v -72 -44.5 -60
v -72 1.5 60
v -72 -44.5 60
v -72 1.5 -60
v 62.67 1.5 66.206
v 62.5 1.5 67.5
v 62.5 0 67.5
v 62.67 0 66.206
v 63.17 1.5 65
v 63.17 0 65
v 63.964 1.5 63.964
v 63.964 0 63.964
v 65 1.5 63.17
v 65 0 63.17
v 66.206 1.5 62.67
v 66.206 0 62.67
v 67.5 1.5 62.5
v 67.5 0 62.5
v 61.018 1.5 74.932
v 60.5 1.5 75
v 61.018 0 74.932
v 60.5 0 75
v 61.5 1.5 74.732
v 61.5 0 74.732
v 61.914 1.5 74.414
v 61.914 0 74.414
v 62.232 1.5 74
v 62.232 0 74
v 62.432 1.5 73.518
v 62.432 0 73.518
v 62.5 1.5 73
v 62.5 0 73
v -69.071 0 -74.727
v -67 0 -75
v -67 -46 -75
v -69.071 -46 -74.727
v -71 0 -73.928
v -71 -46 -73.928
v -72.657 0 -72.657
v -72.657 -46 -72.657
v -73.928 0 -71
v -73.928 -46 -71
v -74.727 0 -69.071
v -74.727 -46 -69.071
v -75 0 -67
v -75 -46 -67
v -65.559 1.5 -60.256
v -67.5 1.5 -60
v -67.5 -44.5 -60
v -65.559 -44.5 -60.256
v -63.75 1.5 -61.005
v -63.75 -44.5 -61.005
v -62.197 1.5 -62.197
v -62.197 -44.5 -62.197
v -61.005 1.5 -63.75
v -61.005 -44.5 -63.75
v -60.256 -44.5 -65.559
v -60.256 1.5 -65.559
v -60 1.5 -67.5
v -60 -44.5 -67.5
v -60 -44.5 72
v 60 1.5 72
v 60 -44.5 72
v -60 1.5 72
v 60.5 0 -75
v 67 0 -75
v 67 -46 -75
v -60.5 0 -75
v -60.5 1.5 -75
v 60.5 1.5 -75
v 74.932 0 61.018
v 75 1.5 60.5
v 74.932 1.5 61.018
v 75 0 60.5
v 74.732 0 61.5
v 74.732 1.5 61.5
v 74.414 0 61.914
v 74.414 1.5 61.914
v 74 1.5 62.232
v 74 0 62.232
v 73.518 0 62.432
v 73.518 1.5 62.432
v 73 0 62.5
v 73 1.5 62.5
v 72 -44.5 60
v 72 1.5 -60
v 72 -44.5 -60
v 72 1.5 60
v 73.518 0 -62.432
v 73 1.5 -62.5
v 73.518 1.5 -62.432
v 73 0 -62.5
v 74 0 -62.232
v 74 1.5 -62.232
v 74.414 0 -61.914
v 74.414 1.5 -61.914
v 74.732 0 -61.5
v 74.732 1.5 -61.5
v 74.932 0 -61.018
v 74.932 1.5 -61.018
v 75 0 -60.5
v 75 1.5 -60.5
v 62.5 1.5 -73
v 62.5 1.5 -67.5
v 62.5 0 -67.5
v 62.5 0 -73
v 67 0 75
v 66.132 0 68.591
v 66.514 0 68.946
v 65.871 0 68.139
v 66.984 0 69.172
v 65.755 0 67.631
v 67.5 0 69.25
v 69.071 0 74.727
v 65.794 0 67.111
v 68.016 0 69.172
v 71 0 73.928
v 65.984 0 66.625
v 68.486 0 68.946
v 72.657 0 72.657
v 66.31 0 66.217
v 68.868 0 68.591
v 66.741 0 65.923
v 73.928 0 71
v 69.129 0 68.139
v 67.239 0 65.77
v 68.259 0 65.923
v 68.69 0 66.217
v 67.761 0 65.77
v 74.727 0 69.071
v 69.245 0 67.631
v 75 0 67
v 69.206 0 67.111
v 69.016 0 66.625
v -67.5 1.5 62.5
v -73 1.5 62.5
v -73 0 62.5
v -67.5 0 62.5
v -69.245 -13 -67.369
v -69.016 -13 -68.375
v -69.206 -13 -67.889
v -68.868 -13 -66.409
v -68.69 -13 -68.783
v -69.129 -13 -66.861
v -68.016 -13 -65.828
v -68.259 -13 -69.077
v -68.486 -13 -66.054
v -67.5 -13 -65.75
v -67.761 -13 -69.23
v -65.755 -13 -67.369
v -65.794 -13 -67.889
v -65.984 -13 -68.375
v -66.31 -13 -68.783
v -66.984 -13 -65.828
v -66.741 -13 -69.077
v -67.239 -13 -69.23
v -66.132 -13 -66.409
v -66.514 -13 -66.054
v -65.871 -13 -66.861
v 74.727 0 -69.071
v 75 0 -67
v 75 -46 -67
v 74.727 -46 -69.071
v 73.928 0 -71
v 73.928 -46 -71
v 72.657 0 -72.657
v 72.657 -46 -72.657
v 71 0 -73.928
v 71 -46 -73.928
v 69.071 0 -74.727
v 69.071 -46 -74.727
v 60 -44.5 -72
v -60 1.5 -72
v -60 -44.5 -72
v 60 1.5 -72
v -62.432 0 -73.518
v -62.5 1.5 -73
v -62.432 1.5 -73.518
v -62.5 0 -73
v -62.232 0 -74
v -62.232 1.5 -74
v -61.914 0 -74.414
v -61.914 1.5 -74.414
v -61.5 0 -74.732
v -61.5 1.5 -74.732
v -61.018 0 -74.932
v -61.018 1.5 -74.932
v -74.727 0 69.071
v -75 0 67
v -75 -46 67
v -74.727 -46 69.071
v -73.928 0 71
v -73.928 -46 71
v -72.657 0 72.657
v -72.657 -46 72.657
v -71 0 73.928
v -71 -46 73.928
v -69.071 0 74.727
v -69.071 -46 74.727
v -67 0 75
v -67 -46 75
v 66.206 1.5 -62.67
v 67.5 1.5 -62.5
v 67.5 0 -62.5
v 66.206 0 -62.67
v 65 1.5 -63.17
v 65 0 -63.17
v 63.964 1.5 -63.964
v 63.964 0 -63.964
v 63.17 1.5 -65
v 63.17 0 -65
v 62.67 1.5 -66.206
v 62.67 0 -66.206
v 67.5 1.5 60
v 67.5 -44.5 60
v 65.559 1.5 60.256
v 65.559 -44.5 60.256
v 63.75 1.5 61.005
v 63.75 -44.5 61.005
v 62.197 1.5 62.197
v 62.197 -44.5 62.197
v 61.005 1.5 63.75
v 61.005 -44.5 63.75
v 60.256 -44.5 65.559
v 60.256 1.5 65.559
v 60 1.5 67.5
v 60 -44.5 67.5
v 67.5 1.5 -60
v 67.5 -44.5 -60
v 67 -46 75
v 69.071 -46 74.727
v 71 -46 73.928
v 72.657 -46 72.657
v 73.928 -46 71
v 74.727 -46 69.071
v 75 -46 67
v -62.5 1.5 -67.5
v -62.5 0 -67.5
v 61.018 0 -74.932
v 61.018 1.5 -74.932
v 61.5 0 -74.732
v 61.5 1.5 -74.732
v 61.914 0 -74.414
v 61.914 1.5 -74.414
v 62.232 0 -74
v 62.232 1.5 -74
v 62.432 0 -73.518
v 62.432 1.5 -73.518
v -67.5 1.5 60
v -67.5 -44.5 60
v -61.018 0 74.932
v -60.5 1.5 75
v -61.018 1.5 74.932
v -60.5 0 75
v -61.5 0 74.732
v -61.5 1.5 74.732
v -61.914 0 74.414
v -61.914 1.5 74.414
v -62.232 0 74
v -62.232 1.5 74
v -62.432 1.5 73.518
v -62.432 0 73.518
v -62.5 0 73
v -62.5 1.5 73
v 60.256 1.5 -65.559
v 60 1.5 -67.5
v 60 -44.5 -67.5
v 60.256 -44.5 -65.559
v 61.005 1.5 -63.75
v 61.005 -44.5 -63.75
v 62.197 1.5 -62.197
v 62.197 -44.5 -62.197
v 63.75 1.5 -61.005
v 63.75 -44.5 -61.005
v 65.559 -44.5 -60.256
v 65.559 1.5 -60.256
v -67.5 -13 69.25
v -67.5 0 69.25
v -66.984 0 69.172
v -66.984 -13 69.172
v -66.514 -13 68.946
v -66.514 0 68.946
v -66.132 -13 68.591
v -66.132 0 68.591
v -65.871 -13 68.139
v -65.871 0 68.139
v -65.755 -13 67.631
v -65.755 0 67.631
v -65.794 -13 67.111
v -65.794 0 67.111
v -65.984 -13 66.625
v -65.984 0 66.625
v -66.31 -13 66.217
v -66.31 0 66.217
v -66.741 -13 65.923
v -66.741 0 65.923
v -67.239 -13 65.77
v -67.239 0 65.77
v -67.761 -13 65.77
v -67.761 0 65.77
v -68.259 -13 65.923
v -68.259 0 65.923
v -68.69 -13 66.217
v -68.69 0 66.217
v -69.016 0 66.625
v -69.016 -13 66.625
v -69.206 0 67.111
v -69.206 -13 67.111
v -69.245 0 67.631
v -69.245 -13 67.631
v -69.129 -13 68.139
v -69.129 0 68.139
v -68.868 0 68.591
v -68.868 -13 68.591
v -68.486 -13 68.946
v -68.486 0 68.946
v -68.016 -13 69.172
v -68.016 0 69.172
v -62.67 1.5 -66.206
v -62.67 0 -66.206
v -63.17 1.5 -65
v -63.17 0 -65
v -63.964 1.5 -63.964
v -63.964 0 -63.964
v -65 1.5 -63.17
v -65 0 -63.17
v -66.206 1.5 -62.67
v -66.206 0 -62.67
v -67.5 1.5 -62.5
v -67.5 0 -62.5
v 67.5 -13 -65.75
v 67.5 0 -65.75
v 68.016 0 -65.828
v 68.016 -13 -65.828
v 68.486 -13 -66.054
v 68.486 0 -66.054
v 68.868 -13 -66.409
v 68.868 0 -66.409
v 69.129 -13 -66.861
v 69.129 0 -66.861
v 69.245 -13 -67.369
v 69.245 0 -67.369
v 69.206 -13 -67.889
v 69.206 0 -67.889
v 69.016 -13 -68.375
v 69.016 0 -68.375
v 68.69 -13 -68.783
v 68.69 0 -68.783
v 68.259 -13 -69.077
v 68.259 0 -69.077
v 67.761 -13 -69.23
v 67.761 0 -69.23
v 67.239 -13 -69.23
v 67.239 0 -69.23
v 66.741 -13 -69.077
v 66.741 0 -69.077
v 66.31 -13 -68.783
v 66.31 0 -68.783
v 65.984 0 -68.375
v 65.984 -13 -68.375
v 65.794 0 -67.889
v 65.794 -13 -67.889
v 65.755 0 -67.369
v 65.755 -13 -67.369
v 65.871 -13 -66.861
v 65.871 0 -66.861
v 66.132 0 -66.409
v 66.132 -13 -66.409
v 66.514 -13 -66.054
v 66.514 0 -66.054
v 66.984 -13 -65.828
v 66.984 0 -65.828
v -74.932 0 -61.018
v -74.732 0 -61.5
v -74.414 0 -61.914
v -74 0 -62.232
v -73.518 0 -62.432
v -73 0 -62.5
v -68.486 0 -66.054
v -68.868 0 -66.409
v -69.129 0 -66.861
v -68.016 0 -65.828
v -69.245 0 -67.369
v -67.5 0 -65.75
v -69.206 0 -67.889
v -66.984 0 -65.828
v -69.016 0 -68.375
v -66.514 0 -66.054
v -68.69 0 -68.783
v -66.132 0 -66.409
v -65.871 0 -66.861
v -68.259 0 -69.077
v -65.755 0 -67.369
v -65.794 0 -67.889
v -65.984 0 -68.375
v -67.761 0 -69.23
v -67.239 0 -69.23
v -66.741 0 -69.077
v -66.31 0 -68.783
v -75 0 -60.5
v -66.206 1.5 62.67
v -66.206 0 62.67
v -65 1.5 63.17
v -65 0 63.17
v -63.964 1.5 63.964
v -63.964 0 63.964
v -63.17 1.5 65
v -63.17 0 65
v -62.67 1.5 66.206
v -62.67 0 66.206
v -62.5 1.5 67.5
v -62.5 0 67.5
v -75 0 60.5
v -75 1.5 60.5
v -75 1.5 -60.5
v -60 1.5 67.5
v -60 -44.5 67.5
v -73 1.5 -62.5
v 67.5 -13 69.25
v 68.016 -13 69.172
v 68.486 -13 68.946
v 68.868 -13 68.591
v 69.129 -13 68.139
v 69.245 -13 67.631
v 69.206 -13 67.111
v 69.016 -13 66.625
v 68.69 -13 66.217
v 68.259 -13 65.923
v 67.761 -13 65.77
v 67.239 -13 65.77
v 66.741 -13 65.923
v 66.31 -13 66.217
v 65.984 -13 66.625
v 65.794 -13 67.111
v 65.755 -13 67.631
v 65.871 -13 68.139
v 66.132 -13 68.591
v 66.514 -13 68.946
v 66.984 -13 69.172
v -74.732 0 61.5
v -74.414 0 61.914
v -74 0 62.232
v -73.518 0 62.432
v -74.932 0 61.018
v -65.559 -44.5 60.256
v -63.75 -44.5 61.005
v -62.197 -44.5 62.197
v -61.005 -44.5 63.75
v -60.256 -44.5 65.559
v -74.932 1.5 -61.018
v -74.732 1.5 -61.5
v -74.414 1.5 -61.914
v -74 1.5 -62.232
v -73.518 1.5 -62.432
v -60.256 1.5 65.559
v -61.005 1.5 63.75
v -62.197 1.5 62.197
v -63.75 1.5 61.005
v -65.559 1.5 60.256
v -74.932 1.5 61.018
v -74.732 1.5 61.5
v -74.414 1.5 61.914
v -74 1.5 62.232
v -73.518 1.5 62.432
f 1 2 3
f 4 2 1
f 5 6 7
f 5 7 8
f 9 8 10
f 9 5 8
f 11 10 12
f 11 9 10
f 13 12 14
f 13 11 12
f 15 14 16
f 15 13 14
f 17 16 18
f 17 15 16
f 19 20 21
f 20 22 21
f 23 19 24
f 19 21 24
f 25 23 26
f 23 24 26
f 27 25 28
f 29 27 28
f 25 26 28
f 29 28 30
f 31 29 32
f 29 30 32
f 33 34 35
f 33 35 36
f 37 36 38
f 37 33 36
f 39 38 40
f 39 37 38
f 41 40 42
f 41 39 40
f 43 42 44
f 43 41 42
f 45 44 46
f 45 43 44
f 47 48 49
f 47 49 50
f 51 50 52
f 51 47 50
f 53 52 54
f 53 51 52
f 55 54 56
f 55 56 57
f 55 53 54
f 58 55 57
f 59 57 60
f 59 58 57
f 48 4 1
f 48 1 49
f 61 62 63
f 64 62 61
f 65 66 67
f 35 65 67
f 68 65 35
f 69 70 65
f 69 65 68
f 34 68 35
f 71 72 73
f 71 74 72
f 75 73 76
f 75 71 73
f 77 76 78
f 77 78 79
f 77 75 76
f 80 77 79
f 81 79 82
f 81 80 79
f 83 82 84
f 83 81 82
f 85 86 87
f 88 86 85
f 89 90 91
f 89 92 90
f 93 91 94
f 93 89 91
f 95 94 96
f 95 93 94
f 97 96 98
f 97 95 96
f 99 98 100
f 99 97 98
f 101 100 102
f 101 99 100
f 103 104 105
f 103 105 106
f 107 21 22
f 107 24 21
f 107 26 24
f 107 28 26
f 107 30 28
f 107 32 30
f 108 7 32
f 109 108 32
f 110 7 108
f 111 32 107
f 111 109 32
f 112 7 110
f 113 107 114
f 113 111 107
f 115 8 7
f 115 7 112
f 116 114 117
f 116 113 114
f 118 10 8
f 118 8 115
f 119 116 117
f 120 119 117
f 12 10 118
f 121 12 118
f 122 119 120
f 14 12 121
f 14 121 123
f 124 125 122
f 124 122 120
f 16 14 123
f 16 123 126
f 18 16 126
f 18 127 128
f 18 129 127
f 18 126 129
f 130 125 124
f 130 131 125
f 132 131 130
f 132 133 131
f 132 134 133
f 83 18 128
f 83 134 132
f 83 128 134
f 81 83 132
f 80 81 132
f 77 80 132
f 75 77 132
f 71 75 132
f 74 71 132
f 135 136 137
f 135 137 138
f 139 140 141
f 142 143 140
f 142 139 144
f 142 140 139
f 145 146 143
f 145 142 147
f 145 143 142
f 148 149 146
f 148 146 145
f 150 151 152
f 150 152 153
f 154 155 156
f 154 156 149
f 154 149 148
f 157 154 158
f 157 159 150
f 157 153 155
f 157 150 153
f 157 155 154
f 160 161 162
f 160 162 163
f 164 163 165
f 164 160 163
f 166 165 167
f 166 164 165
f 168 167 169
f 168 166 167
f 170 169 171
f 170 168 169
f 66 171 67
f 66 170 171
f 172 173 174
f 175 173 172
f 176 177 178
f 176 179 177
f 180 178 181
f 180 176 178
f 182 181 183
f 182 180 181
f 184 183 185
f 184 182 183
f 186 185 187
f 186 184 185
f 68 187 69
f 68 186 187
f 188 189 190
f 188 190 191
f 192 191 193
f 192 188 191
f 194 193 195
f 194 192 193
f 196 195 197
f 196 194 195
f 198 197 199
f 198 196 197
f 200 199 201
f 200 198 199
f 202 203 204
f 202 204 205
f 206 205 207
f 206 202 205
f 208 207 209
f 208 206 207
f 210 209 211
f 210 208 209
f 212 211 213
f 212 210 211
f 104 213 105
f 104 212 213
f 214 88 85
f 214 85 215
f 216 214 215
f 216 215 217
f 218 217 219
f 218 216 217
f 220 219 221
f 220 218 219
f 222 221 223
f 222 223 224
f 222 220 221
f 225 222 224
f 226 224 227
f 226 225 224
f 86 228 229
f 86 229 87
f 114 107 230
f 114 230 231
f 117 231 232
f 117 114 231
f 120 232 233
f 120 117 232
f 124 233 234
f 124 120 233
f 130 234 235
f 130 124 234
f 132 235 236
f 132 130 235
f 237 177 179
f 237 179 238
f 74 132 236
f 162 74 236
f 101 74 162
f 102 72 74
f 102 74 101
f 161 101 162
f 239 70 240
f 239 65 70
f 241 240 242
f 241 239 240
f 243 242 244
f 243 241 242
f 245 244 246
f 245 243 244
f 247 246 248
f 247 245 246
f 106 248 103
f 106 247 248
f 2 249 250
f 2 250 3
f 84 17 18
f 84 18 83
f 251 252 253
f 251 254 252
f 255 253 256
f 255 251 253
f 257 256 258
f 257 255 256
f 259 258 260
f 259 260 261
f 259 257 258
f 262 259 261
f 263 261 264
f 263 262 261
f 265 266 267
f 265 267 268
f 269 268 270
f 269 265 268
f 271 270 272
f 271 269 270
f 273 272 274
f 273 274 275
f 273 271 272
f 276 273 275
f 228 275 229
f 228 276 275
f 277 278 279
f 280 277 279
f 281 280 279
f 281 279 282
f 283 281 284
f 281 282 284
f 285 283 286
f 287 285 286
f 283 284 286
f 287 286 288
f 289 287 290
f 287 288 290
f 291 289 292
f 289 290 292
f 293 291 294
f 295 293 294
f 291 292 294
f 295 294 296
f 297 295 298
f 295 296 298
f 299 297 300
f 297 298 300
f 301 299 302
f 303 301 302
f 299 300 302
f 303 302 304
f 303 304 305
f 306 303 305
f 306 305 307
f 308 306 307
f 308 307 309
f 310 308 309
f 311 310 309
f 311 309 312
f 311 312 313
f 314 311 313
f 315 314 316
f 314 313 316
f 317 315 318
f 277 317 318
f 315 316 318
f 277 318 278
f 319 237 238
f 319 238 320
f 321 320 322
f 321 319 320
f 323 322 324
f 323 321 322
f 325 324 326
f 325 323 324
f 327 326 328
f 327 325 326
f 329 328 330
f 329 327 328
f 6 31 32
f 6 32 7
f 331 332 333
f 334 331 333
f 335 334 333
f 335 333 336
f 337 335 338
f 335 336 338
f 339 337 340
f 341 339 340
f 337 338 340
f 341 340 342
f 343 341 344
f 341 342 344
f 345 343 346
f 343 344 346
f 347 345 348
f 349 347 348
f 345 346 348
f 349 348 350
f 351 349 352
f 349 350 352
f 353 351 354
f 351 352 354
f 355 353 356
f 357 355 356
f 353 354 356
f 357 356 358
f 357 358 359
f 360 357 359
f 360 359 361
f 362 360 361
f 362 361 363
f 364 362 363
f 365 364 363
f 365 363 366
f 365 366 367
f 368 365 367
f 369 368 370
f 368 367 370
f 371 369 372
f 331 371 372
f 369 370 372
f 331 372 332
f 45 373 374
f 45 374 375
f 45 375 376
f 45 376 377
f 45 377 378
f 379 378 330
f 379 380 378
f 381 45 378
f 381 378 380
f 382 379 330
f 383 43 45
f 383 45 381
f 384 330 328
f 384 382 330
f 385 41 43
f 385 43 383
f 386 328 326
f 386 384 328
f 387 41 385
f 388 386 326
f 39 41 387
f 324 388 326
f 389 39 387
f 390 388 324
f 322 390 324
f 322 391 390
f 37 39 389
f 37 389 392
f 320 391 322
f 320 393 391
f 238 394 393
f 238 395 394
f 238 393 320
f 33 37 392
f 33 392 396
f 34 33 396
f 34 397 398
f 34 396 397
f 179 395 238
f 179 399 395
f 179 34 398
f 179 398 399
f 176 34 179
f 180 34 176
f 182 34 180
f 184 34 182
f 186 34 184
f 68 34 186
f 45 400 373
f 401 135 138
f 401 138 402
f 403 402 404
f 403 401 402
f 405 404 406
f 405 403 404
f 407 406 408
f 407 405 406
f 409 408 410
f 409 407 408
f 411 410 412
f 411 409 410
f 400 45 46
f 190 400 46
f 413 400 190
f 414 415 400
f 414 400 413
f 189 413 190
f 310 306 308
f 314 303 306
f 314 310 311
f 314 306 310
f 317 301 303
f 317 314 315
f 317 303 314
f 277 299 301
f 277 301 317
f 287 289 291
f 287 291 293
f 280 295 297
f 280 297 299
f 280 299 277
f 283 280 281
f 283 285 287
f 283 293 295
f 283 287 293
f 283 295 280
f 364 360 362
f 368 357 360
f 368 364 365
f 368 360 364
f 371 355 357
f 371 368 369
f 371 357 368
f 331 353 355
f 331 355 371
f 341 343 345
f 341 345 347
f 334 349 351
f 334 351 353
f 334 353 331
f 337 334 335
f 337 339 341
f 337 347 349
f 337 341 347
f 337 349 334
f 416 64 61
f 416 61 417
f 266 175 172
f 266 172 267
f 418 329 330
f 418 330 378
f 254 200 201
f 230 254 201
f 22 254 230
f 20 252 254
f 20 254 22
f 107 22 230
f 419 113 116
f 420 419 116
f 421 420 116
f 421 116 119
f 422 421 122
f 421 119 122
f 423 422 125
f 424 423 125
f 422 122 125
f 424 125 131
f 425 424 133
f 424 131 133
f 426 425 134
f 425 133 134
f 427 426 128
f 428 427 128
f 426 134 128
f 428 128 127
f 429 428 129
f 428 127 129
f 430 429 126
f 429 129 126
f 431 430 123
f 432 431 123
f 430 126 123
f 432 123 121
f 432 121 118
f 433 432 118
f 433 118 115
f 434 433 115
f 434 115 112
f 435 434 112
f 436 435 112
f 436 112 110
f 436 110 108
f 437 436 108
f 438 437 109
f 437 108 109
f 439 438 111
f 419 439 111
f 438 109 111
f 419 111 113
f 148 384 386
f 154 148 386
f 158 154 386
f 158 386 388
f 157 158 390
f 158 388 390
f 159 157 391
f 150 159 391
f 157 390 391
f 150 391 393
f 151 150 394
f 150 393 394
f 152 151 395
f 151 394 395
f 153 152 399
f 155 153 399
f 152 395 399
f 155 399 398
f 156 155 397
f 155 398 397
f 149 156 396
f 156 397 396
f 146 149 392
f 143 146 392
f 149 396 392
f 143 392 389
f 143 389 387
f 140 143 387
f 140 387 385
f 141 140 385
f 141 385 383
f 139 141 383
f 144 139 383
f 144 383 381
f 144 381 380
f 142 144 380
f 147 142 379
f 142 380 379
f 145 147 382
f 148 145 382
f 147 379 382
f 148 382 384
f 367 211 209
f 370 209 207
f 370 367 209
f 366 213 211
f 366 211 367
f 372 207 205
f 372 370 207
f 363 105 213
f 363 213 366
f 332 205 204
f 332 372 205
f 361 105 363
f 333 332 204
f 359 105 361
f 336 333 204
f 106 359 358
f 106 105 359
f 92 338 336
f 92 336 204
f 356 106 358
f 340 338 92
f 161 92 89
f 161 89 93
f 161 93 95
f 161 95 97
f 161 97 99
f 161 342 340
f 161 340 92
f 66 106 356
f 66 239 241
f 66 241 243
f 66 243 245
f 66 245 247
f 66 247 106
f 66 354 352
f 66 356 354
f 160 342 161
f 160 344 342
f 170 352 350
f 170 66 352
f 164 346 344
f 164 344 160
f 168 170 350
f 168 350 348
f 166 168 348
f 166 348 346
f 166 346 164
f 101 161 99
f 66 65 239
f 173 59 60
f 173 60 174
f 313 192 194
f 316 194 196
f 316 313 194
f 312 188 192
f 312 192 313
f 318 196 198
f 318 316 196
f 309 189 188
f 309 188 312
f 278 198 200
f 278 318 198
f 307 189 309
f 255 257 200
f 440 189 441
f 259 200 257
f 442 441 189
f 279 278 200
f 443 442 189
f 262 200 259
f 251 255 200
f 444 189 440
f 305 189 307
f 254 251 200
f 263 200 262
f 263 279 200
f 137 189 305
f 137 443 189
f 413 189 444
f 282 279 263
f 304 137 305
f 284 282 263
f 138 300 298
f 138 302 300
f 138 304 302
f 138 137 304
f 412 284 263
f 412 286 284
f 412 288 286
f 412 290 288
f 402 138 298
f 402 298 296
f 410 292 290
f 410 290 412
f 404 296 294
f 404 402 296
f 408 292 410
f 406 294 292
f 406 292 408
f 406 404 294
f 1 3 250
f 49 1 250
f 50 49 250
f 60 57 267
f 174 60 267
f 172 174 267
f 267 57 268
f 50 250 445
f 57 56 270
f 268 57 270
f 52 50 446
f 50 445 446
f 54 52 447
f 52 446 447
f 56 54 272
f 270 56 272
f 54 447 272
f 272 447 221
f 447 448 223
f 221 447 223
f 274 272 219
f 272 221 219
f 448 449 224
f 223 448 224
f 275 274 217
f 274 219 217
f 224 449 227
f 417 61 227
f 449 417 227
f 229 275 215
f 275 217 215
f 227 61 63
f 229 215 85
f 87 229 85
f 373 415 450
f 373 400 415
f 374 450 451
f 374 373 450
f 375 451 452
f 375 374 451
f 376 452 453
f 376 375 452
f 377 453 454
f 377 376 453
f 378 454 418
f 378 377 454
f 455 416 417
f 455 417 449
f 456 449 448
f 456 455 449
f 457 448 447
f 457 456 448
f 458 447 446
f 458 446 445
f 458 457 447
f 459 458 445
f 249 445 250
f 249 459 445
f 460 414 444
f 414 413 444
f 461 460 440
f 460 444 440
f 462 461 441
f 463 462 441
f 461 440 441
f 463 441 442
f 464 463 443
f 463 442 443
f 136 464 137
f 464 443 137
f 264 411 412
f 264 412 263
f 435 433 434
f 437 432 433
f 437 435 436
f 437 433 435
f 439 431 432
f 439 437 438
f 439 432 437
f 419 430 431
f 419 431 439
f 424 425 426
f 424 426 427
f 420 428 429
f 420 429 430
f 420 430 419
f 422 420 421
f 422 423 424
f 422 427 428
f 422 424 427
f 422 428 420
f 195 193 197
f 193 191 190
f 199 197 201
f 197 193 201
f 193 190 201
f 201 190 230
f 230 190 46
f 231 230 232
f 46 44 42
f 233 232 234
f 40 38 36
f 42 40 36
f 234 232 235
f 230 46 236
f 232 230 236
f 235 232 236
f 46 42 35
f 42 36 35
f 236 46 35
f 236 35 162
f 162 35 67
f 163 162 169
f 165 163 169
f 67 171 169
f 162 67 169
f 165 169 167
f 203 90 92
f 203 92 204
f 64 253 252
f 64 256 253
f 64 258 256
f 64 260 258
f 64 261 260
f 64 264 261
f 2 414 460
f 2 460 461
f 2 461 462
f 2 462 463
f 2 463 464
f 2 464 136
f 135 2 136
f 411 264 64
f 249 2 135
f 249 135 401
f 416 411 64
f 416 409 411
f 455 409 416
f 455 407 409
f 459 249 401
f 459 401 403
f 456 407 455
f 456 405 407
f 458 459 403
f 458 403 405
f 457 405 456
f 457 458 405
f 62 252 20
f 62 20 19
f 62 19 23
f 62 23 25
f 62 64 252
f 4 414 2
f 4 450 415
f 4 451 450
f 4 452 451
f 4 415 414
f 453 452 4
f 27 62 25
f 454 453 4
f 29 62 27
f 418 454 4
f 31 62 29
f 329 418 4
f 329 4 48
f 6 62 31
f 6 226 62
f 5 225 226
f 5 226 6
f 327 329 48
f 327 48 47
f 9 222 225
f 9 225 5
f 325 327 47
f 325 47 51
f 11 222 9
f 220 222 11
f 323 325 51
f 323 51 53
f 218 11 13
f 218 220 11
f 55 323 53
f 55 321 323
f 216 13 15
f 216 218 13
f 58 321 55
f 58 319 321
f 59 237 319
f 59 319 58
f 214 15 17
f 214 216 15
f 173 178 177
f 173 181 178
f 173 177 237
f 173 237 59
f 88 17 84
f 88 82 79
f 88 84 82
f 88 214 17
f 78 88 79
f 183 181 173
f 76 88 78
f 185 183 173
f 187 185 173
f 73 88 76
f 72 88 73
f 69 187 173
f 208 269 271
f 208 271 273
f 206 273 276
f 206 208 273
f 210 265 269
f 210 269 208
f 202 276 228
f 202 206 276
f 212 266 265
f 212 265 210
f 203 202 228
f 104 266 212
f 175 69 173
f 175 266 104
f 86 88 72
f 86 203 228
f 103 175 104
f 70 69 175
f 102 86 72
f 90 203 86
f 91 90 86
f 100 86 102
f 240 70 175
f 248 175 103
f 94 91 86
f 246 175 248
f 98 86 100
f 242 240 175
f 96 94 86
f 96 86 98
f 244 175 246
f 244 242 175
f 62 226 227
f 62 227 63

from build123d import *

# Parameters (mm, degrees)
BOSS_EXTRUDE1_DEPTH = 46
BOSS_EXTRUDE2_START = 1.5
BOSS_EXTRUDE2_DEPTH = 1.5
SKETCH1_4_R         = 1.75
CUT_EXTRUDE1_DEPTH  = 13
BOSS_EXTRUDE3_START = -1.5
BOSS_EXTRUDE3_DEPTH = 1.5
FILLET1_R           = 2


with BuildPart() as part:
    # Sketch1 → Boss-Extrude1 (new body)
    with BuildSketch(Plane(origin=(0, 0, 0), x_dir=(1, 0, 0), z_dir=(0, 1, 0))):
        with BuildLine():
            ThreePointArc((-75, -67), (-72.656854249, -72.656854249), (-67, -75))
            Line((-67, -75), (67, -75))
            ThreePointArc((67, -75), (72.656854249, -72.656854249), (75, -67))
            Line((75, -67), (75, 67))
            ThreePointArc((75, 67), (72.656854249, 72.656854249), (67, 75))
            Line((67, 75), (-67, 75))
            ThreePointArc((-67, 75), (-72.656854249, 72.656854249), (-75, 67))
            Line((-75, 67), (-75, -67))
        make_face()
        with BuildLine():
            ThreePointArc((-67.5, 60), (-62.196699141, 62.196699141), (-60, 67.5))
            Line((-60, 67.5), (-60, 72))
            Line((-60, 72), (60, 72))
            Line((60, 72), (60, 67.5))
            ThreePointArc((60, 67.5), (62.196699141, 62.196699141), (67.5, 60))
            Line((67.5, 60), (72, 60))
            Line((72, 60), (72, -60))
            Line((72, -60), (67.5, -60))
            ThreePointArc((67.5, -60), (62.196699141, -62.196699141), (60, -67.5))
            Line((60, -67.5), (60, -72))
            Line((60, -72), (-60, -72))
            Line((-60, -72), (-60, -67.5))
            ThreePointArc((-60, -67.5), (-62.196699141, -62.196699141), (-67.5, -60))
            Line((-67.5, -60), (-72, -60))
            Line((-72, -60), (-72, 60))
            Line((-72, 60), (-67.5, 60))
        make_face(mode=Mode.SUBTRACT)
    extrude(amount=-BOSS_EXTRUDE1_DEPTH)

    # Sketch1<3> → Boss-Extrude2 (add)
    with BuildSketch(Plane(origin=(0, 0, 0), x_dir=(1, 0, 0), z_dir=(0, 1, 0)).offset(BOSS_EXTRUDE2_START)):
        with BuildLine():
            Line((-62.5, -67.5), (-62.5, -75))
            Line((-62.5, -75), (62.5, -75))
            Line((62.5, -75), (62.5, -67.5))
            ThreePointArc((62.5, -67.5), (63.964466094, -63.964466094), (67.5, -62.5))
            Line((67.5, -62.5), (75, -62.5))
            Line((75, -62.5), (75, 62.5))
            Line((75, 62.5), (67.5, 62.5))
            ThreePointArc((67.5, 62.5), (63.964466094, 63.964466094), (62.5, 67.5))
            Line((62.5, 67.5), (62.5, 75))
            Line((62.5, 75), (-62.5, 75))
            Line((-62.5, 75), (-62.5, 67.5))
            ThreePointArc((-62.5, 67.5), (-63.964466094, 63.964466094), (-67.5, 62.5))
            Line((-67.5, 62.5), (-75, 62.5))
            Line((-75, 62.5), (-75, -62.5))
            Line((-75, -62.5), (-67.5, -62.5))
            ThreePointArc((-67.5, -62.5), (-63.964466094, -63.964466094), (-62.5, -67.5))
        make_face()
        with BuildLine():
            Line((-67.5, -60), (-72, -60))
            Line((-72, -60), (-72, 60))
            Line((-72, 60), (-67.5, 60))
            ThreePointArc((-67.5, 60), (-62.196699141, 62.196699141), (-60, 67.5))
            Line((-60, 67.5), (-60, 72))
            Line((-60, 72), (60, 72))
            Line((60, 72), (60, 67.5))
            ThreePointArc((60, 67.5), (62.196699141, 62.196699141), (67.5, 60))
            Line((67.5, 60), (72, 60))
            Line((72, 60), (72, -60))
            Line((72, -60), (67.5, -60))
            ThreePointArc((67.5, -60), (62.196699141, -62.196699141), (60, -67.5))
            Line((60, -67.5), (60, -72))
            Line((60, -72), (-60, -72))
            Line((-60, -72), (-60, -67.5))
            ThreePointArc((-60, -67.5), (-62.196699141, -62.196699141), (-67.5, -60))
        make_face(mode=Mode.SUBTRACT)
    extrude(amount=-BOSS_EXTRUDE2_DEPTH)

    # Sketch1<4> → Cut-Extrude1 (cut)
    with BuildSketch(Plane(origin=(0, 0, 0), x_dir=(1, 0, 0), z_dir=(0, 1, 0))):
        with Locations((-67.5, 67.5)):
            Circle(SKETCH1_4_R)
        with Locations((67.5, 67.5)):
            Circle(SKETCH1_4_R)
        with Locations((67.5, -67.5)):
            Circle(SKETCH1_4_R)
        with Locations((-67.5, -67.5)):
            Circle(SKETCH1_4_R)
    extrude(amount=-CUT_EXTRUDE1_DEPTH, mode=Mode.SUBTRACT)

    # Sketch2 → Boss-Extrude3 (add)
    with BuildSketch(Plane.XZ.offset(46).offset(BOSS_EXTRUDE3_START)):
        with BuildLine():
            Line((-75, 67), (-75, -67))
            ThreePointArc((-75, -67), (-72.656854249, -72.656854249), (-67, -75))
            Line((-67, -75), (67, -75))
            ThreePointArc((67, -75), (72.656854249, -72.656854249), (75, -67))
            Line((75, -67), (75, 67))
            ThreePointArc((75, 67), (72.656854249, 72.656854249), (67, 75))
            Line((67, 75), (-67, 75))
            ThreePointArc((-67, 75), (-72.656854249, 72.656854249), (-75, 67))
        make_face()
    extrude(amount=BOSS_EXTRUDE3_DEPTH)

    # Fillet1
    fillet1_edges = [part.edges().sort_by_distance(p)[0] for p in [
        (62.5, 0.75, -75),
        (75, 0.75, -62.5),
        (75, 0.75, 62.5),
        (62.5, 0.75, 75),
        (-62.5, 0.75, 75),
        (-75, 0.75, 62.5),
        (-75, 0.75, -62.5),
        (-62.5, 0.75, -75),
    ]]
    fillet(fillet1_edges, radius=FILLET1_R)


solid = part.part
